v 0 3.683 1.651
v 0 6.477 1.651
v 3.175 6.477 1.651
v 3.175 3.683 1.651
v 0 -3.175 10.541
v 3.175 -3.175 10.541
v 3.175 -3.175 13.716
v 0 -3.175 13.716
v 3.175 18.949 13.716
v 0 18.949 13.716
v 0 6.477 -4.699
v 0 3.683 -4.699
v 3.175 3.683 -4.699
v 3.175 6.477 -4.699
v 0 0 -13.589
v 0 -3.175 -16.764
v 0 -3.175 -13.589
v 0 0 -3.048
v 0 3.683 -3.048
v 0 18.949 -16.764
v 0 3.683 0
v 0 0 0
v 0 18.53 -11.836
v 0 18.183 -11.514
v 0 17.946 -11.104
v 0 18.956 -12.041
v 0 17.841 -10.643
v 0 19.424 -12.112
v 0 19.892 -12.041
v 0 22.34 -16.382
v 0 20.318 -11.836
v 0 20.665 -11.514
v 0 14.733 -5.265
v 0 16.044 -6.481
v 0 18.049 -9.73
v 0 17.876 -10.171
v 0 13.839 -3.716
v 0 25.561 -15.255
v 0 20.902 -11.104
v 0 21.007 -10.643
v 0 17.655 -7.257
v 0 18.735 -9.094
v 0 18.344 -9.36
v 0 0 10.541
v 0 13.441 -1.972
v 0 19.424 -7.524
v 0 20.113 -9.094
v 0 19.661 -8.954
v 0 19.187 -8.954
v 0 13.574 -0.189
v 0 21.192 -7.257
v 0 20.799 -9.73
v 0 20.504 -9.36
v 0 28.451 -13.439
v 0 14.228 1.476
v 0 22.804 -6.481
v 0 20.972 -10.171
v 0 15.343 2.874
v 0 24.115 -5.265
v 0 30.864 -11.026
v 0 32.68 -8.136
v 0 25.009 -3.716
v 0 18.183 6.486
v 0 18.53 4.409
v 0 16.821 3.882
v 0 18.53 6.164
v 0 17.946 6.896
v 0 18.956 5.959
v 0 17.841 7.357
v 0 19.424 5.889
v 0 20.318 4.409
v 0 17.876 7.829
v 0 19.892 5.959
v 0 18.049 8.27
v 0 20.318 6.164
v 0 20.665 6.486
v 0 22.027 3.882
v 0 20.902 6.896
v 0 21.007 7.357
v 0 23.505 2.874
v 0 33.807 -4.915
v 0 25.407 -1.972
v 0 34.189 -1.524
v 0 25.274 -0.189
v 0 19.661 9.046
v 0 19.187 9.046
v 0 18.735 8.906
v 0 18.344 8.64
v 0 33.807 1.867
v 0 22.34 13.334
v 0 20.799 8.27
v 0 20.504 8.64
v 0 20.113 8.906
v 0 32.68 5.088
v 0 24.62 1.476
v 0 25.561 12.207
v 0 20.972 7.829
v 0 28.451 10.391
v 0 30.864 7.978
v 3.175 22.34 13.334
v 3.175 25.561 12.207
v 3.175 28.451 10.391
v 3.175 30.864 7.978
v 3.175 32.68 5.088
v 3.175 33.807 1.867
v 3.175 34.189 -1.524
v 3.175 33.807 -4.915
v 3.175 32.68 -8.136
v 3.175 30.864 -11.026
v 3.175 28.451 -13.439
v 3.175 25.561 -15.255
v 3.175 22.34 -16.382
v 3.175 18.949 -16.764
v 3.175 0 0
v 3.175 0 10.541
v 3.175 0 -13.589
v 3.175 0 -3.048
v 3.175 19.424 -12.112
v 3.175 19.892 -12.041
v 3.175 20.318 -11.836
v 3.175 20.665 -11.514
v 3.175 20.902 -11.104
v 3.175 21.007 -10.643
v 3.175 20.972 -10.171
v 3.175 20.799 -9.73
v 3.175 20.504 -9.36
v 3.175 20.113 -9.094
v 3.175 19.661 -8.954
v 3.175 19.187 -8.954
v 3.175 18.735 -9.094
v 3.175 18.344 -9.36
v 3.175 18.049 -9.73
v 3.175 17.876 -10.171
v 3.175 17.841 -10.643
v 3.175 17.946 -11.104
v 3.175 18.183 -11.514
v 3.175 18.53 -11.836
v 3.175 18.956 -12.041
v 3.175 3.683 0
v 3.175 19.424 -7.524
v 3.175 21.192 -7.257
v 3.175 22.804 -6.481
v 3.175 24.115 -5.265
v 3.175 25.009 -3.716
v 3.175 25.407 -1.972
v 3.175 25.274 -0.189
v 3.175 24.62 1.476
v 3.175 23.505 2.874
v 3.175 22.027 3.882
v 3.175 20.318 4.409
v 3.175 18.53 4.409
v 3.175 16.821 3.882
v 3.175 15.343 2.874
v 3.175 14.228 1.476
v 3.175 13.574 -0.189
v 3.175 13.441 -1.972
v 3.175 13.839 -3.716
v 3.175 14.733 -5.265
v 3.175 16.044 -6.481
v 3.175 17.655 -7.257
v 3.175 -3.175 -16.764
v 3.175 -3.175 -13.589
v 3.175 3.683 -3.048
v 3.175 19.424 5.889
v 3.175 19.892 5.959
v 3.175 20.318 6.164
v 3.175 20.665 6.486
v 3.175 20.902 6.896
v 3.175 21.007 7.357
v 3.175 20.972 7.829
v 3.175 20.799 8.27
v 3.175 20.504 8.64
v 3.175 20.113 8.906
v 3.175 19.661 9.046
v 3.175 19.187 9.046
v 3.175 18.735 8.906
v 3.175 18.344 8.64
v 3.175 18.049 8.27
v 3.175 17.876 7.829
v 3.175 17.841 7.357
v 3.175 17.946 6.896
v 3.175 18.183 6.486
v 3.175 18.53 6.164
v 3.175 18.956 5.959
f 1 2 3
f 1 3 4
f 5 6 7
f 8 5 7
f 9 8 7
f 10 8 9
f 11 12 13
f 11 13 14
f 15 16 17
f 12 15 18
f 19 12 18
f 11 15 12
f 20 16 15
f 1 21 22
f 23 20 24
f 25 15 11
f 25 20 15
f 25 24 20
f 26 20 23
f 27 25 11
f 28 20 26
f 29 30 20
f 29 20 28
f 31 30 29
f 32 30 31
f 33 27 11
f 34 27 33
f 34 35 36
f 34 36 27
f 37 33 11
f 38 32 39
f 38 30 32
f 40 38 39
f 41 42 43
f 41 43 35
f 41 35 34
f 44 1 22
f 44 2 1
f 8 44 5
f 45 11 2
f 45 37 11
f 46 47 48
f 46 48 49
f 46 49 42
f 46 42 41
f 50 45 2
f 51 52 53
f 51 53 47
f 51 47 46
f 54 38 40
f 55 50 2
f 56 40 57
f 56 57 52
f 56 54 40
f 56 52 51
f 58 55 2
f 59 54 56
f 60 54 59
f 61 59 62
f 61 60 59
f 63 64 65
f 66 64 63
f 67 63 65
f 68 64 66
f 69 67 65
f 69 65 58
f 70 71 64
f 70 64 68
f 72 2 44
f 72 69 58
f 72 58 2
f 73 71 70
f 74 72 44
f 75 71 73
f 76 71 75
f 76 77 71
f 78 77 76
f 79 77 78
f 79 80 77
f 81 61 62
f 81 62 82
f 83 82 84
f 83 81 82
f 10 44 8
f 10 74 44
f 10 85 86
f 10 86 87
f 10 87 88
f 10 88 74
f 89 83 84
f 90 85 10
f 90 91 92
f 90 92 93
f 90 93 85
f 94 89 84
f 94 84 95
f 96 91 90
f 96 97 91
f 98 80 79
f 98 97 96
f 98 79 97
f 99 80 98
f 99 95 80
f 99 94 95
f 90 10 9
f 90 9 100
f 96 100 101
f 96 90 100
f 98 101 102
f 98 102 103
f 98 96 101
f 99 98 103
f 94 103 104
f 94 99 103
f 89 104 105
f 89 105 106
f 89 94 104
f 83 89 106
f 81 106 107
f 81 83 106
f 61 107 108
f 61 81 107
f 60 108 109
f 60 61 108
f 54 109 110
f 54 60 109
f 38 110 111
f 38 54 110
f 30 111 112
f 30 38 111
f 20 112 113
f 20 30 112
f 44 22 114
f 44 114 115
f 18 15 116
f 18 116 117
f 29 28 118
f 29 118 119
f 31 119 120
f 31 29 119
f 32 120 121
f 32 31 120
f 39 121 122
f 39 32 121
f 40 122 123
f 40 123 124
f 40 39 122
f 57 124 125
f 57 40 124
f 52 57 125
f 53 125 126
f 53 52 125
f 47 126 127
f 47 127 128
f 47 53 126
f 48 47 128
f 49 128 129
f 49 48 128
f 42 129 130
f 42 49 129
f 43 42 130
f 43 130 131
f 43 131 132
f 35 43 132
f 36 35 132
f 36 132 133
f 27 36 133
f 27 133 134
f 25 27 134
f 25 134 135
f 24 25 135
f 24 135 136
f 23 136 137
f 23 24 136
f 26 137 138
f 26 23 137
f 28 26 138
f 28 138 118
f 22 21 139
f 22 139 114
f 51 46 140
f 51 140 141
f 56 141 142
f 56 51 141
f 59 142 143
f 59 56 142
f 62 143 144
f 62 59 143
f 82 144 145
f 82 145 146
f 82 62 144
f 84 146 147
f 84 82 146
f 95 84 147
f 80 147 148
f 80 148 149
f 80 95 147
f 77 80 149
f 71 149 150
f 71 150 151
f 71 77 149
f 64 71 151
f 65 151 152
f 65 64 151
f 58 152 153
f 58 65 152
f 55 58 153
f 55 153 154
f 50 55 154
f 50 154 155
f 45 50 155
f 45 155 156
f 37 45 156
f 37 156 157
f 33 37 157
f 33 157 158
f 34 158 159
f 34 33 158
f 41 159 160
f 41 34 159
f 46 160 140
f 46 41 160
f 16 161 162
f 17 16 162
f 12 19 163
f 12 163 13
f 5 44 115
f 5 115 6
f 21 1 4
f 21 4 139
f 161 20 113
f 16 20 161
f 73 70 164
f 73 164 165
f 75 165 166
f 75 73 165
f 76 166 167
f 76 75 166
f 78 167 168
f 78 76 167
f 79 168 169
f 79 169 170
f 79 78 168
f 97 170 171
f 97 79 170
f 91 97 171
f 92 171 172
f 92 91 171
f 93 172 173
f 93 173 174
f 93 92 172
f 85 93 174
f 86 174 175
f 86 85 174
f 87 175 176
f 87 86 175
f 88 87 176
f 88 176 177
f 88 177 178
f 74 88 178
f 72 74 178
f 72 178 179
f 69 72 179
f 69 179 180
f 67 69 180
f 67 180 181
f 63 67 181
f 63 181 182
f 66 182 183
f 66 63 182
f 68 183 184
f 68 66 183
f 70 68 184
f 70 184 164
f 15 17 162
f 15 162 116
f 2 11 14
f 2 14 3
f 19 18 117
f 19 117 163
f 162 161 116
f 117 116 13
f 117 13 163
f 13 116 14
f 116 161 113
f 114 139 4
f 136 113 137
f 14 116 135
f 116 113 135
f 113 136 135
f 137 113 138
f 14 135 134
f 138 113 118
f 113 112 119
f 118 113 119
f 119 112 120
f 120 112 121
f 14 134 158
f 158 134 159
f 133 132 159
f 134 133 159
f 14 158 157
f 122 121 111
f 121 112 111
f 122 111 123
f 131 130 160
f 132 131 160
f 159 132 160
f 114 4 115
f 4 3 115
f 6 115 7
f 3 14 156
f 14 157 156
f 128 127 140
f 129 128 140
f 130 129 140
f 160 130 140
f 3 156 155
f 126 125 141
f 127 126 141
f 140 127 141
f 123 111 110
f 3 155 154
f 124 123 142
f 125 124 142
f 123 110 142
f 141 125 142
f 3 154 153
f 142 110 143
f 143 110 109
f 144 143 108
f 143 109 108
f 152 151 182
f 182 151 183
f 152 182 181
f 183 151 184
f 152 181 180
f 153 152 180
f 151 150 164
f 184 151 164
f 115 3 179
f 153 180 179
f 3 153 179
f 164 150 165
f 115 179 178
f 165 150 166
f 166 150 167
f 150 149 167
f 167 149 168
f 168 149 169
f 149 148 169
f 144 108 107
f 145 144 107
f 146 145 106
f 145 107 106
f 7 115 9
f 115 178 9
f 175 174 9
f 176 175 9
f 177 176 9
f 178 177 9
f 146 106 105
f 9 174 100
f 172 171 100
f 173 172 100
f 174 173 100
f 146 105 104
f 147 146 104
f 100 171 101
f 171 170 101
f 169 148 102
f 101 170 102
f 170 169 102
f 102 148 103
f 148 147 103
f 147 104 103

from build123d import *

# Parameters (mm, degrees)
SKETCH1_R           = 6
SKETCH1_R_2         = 1.5875
BOSS_EXTRUDE1_DEPTH = 3.175


with BuildPart() as part:
    # Sketch1 → Boss-Extrude1 (new body)
    with BuildSketch(Plane(origin=(0, 0, 0), x_dir=(0, 0, -1), z_dir=(1, 0, 0))):
        with BuildLine():
            Line((-13.716, -3.175), (-13.716, 18.94882794))
            ThreePointArc((-13.716, 18.94882794), (1.524, 34.18882794), (16.764, 18.94882794))
            Line((16.764, 18.94882794), (16.764, -3.175))
            Line((16.764, -3.175), (13.589, -3.175))
            Line((13.589, -3.175), (13.589, 0))
            Line((13.589, 0), (3.048, 0))
            Line((3.048, 0), (3.048, 3.683))
            Line((3.048, 3.683), (4.699, 3.683))
            Line((4.699, 3.683), (4.699, 6.477))
            Line((4.699, 6.477), (-1.651, 6.477))
            Line((-1.651, 6.477), (-1.651, 3.683))
            Line((-1.651, 3.683), (0, 3.683))
            Line((0, 3.683), (0, 0))
            Line((0, 0), (-10.541, 0))
            Line((-10.541, 0), (-10.541, -3.175))
            Line((-10.541, -3.175), (-13.716, -3.175))
        make_face()
        with Locations((1.524, 19.423957259)):
            Circle(SKETCH1_R, mode=Mode.SUBTRACT)
        with Locations((-7.476, 19.423957259)):
            Circle(SKETCH1_R_2, mode=Mode.SUBTRACT)
        with Locations((10.524, 19.423957259)):
            Circle(SKETCH1_R_2, mode=Mode.SUBTRACT)
    extrude(amount=BOSS_EXTRUDE1_DEPTH)


solid = part.part
